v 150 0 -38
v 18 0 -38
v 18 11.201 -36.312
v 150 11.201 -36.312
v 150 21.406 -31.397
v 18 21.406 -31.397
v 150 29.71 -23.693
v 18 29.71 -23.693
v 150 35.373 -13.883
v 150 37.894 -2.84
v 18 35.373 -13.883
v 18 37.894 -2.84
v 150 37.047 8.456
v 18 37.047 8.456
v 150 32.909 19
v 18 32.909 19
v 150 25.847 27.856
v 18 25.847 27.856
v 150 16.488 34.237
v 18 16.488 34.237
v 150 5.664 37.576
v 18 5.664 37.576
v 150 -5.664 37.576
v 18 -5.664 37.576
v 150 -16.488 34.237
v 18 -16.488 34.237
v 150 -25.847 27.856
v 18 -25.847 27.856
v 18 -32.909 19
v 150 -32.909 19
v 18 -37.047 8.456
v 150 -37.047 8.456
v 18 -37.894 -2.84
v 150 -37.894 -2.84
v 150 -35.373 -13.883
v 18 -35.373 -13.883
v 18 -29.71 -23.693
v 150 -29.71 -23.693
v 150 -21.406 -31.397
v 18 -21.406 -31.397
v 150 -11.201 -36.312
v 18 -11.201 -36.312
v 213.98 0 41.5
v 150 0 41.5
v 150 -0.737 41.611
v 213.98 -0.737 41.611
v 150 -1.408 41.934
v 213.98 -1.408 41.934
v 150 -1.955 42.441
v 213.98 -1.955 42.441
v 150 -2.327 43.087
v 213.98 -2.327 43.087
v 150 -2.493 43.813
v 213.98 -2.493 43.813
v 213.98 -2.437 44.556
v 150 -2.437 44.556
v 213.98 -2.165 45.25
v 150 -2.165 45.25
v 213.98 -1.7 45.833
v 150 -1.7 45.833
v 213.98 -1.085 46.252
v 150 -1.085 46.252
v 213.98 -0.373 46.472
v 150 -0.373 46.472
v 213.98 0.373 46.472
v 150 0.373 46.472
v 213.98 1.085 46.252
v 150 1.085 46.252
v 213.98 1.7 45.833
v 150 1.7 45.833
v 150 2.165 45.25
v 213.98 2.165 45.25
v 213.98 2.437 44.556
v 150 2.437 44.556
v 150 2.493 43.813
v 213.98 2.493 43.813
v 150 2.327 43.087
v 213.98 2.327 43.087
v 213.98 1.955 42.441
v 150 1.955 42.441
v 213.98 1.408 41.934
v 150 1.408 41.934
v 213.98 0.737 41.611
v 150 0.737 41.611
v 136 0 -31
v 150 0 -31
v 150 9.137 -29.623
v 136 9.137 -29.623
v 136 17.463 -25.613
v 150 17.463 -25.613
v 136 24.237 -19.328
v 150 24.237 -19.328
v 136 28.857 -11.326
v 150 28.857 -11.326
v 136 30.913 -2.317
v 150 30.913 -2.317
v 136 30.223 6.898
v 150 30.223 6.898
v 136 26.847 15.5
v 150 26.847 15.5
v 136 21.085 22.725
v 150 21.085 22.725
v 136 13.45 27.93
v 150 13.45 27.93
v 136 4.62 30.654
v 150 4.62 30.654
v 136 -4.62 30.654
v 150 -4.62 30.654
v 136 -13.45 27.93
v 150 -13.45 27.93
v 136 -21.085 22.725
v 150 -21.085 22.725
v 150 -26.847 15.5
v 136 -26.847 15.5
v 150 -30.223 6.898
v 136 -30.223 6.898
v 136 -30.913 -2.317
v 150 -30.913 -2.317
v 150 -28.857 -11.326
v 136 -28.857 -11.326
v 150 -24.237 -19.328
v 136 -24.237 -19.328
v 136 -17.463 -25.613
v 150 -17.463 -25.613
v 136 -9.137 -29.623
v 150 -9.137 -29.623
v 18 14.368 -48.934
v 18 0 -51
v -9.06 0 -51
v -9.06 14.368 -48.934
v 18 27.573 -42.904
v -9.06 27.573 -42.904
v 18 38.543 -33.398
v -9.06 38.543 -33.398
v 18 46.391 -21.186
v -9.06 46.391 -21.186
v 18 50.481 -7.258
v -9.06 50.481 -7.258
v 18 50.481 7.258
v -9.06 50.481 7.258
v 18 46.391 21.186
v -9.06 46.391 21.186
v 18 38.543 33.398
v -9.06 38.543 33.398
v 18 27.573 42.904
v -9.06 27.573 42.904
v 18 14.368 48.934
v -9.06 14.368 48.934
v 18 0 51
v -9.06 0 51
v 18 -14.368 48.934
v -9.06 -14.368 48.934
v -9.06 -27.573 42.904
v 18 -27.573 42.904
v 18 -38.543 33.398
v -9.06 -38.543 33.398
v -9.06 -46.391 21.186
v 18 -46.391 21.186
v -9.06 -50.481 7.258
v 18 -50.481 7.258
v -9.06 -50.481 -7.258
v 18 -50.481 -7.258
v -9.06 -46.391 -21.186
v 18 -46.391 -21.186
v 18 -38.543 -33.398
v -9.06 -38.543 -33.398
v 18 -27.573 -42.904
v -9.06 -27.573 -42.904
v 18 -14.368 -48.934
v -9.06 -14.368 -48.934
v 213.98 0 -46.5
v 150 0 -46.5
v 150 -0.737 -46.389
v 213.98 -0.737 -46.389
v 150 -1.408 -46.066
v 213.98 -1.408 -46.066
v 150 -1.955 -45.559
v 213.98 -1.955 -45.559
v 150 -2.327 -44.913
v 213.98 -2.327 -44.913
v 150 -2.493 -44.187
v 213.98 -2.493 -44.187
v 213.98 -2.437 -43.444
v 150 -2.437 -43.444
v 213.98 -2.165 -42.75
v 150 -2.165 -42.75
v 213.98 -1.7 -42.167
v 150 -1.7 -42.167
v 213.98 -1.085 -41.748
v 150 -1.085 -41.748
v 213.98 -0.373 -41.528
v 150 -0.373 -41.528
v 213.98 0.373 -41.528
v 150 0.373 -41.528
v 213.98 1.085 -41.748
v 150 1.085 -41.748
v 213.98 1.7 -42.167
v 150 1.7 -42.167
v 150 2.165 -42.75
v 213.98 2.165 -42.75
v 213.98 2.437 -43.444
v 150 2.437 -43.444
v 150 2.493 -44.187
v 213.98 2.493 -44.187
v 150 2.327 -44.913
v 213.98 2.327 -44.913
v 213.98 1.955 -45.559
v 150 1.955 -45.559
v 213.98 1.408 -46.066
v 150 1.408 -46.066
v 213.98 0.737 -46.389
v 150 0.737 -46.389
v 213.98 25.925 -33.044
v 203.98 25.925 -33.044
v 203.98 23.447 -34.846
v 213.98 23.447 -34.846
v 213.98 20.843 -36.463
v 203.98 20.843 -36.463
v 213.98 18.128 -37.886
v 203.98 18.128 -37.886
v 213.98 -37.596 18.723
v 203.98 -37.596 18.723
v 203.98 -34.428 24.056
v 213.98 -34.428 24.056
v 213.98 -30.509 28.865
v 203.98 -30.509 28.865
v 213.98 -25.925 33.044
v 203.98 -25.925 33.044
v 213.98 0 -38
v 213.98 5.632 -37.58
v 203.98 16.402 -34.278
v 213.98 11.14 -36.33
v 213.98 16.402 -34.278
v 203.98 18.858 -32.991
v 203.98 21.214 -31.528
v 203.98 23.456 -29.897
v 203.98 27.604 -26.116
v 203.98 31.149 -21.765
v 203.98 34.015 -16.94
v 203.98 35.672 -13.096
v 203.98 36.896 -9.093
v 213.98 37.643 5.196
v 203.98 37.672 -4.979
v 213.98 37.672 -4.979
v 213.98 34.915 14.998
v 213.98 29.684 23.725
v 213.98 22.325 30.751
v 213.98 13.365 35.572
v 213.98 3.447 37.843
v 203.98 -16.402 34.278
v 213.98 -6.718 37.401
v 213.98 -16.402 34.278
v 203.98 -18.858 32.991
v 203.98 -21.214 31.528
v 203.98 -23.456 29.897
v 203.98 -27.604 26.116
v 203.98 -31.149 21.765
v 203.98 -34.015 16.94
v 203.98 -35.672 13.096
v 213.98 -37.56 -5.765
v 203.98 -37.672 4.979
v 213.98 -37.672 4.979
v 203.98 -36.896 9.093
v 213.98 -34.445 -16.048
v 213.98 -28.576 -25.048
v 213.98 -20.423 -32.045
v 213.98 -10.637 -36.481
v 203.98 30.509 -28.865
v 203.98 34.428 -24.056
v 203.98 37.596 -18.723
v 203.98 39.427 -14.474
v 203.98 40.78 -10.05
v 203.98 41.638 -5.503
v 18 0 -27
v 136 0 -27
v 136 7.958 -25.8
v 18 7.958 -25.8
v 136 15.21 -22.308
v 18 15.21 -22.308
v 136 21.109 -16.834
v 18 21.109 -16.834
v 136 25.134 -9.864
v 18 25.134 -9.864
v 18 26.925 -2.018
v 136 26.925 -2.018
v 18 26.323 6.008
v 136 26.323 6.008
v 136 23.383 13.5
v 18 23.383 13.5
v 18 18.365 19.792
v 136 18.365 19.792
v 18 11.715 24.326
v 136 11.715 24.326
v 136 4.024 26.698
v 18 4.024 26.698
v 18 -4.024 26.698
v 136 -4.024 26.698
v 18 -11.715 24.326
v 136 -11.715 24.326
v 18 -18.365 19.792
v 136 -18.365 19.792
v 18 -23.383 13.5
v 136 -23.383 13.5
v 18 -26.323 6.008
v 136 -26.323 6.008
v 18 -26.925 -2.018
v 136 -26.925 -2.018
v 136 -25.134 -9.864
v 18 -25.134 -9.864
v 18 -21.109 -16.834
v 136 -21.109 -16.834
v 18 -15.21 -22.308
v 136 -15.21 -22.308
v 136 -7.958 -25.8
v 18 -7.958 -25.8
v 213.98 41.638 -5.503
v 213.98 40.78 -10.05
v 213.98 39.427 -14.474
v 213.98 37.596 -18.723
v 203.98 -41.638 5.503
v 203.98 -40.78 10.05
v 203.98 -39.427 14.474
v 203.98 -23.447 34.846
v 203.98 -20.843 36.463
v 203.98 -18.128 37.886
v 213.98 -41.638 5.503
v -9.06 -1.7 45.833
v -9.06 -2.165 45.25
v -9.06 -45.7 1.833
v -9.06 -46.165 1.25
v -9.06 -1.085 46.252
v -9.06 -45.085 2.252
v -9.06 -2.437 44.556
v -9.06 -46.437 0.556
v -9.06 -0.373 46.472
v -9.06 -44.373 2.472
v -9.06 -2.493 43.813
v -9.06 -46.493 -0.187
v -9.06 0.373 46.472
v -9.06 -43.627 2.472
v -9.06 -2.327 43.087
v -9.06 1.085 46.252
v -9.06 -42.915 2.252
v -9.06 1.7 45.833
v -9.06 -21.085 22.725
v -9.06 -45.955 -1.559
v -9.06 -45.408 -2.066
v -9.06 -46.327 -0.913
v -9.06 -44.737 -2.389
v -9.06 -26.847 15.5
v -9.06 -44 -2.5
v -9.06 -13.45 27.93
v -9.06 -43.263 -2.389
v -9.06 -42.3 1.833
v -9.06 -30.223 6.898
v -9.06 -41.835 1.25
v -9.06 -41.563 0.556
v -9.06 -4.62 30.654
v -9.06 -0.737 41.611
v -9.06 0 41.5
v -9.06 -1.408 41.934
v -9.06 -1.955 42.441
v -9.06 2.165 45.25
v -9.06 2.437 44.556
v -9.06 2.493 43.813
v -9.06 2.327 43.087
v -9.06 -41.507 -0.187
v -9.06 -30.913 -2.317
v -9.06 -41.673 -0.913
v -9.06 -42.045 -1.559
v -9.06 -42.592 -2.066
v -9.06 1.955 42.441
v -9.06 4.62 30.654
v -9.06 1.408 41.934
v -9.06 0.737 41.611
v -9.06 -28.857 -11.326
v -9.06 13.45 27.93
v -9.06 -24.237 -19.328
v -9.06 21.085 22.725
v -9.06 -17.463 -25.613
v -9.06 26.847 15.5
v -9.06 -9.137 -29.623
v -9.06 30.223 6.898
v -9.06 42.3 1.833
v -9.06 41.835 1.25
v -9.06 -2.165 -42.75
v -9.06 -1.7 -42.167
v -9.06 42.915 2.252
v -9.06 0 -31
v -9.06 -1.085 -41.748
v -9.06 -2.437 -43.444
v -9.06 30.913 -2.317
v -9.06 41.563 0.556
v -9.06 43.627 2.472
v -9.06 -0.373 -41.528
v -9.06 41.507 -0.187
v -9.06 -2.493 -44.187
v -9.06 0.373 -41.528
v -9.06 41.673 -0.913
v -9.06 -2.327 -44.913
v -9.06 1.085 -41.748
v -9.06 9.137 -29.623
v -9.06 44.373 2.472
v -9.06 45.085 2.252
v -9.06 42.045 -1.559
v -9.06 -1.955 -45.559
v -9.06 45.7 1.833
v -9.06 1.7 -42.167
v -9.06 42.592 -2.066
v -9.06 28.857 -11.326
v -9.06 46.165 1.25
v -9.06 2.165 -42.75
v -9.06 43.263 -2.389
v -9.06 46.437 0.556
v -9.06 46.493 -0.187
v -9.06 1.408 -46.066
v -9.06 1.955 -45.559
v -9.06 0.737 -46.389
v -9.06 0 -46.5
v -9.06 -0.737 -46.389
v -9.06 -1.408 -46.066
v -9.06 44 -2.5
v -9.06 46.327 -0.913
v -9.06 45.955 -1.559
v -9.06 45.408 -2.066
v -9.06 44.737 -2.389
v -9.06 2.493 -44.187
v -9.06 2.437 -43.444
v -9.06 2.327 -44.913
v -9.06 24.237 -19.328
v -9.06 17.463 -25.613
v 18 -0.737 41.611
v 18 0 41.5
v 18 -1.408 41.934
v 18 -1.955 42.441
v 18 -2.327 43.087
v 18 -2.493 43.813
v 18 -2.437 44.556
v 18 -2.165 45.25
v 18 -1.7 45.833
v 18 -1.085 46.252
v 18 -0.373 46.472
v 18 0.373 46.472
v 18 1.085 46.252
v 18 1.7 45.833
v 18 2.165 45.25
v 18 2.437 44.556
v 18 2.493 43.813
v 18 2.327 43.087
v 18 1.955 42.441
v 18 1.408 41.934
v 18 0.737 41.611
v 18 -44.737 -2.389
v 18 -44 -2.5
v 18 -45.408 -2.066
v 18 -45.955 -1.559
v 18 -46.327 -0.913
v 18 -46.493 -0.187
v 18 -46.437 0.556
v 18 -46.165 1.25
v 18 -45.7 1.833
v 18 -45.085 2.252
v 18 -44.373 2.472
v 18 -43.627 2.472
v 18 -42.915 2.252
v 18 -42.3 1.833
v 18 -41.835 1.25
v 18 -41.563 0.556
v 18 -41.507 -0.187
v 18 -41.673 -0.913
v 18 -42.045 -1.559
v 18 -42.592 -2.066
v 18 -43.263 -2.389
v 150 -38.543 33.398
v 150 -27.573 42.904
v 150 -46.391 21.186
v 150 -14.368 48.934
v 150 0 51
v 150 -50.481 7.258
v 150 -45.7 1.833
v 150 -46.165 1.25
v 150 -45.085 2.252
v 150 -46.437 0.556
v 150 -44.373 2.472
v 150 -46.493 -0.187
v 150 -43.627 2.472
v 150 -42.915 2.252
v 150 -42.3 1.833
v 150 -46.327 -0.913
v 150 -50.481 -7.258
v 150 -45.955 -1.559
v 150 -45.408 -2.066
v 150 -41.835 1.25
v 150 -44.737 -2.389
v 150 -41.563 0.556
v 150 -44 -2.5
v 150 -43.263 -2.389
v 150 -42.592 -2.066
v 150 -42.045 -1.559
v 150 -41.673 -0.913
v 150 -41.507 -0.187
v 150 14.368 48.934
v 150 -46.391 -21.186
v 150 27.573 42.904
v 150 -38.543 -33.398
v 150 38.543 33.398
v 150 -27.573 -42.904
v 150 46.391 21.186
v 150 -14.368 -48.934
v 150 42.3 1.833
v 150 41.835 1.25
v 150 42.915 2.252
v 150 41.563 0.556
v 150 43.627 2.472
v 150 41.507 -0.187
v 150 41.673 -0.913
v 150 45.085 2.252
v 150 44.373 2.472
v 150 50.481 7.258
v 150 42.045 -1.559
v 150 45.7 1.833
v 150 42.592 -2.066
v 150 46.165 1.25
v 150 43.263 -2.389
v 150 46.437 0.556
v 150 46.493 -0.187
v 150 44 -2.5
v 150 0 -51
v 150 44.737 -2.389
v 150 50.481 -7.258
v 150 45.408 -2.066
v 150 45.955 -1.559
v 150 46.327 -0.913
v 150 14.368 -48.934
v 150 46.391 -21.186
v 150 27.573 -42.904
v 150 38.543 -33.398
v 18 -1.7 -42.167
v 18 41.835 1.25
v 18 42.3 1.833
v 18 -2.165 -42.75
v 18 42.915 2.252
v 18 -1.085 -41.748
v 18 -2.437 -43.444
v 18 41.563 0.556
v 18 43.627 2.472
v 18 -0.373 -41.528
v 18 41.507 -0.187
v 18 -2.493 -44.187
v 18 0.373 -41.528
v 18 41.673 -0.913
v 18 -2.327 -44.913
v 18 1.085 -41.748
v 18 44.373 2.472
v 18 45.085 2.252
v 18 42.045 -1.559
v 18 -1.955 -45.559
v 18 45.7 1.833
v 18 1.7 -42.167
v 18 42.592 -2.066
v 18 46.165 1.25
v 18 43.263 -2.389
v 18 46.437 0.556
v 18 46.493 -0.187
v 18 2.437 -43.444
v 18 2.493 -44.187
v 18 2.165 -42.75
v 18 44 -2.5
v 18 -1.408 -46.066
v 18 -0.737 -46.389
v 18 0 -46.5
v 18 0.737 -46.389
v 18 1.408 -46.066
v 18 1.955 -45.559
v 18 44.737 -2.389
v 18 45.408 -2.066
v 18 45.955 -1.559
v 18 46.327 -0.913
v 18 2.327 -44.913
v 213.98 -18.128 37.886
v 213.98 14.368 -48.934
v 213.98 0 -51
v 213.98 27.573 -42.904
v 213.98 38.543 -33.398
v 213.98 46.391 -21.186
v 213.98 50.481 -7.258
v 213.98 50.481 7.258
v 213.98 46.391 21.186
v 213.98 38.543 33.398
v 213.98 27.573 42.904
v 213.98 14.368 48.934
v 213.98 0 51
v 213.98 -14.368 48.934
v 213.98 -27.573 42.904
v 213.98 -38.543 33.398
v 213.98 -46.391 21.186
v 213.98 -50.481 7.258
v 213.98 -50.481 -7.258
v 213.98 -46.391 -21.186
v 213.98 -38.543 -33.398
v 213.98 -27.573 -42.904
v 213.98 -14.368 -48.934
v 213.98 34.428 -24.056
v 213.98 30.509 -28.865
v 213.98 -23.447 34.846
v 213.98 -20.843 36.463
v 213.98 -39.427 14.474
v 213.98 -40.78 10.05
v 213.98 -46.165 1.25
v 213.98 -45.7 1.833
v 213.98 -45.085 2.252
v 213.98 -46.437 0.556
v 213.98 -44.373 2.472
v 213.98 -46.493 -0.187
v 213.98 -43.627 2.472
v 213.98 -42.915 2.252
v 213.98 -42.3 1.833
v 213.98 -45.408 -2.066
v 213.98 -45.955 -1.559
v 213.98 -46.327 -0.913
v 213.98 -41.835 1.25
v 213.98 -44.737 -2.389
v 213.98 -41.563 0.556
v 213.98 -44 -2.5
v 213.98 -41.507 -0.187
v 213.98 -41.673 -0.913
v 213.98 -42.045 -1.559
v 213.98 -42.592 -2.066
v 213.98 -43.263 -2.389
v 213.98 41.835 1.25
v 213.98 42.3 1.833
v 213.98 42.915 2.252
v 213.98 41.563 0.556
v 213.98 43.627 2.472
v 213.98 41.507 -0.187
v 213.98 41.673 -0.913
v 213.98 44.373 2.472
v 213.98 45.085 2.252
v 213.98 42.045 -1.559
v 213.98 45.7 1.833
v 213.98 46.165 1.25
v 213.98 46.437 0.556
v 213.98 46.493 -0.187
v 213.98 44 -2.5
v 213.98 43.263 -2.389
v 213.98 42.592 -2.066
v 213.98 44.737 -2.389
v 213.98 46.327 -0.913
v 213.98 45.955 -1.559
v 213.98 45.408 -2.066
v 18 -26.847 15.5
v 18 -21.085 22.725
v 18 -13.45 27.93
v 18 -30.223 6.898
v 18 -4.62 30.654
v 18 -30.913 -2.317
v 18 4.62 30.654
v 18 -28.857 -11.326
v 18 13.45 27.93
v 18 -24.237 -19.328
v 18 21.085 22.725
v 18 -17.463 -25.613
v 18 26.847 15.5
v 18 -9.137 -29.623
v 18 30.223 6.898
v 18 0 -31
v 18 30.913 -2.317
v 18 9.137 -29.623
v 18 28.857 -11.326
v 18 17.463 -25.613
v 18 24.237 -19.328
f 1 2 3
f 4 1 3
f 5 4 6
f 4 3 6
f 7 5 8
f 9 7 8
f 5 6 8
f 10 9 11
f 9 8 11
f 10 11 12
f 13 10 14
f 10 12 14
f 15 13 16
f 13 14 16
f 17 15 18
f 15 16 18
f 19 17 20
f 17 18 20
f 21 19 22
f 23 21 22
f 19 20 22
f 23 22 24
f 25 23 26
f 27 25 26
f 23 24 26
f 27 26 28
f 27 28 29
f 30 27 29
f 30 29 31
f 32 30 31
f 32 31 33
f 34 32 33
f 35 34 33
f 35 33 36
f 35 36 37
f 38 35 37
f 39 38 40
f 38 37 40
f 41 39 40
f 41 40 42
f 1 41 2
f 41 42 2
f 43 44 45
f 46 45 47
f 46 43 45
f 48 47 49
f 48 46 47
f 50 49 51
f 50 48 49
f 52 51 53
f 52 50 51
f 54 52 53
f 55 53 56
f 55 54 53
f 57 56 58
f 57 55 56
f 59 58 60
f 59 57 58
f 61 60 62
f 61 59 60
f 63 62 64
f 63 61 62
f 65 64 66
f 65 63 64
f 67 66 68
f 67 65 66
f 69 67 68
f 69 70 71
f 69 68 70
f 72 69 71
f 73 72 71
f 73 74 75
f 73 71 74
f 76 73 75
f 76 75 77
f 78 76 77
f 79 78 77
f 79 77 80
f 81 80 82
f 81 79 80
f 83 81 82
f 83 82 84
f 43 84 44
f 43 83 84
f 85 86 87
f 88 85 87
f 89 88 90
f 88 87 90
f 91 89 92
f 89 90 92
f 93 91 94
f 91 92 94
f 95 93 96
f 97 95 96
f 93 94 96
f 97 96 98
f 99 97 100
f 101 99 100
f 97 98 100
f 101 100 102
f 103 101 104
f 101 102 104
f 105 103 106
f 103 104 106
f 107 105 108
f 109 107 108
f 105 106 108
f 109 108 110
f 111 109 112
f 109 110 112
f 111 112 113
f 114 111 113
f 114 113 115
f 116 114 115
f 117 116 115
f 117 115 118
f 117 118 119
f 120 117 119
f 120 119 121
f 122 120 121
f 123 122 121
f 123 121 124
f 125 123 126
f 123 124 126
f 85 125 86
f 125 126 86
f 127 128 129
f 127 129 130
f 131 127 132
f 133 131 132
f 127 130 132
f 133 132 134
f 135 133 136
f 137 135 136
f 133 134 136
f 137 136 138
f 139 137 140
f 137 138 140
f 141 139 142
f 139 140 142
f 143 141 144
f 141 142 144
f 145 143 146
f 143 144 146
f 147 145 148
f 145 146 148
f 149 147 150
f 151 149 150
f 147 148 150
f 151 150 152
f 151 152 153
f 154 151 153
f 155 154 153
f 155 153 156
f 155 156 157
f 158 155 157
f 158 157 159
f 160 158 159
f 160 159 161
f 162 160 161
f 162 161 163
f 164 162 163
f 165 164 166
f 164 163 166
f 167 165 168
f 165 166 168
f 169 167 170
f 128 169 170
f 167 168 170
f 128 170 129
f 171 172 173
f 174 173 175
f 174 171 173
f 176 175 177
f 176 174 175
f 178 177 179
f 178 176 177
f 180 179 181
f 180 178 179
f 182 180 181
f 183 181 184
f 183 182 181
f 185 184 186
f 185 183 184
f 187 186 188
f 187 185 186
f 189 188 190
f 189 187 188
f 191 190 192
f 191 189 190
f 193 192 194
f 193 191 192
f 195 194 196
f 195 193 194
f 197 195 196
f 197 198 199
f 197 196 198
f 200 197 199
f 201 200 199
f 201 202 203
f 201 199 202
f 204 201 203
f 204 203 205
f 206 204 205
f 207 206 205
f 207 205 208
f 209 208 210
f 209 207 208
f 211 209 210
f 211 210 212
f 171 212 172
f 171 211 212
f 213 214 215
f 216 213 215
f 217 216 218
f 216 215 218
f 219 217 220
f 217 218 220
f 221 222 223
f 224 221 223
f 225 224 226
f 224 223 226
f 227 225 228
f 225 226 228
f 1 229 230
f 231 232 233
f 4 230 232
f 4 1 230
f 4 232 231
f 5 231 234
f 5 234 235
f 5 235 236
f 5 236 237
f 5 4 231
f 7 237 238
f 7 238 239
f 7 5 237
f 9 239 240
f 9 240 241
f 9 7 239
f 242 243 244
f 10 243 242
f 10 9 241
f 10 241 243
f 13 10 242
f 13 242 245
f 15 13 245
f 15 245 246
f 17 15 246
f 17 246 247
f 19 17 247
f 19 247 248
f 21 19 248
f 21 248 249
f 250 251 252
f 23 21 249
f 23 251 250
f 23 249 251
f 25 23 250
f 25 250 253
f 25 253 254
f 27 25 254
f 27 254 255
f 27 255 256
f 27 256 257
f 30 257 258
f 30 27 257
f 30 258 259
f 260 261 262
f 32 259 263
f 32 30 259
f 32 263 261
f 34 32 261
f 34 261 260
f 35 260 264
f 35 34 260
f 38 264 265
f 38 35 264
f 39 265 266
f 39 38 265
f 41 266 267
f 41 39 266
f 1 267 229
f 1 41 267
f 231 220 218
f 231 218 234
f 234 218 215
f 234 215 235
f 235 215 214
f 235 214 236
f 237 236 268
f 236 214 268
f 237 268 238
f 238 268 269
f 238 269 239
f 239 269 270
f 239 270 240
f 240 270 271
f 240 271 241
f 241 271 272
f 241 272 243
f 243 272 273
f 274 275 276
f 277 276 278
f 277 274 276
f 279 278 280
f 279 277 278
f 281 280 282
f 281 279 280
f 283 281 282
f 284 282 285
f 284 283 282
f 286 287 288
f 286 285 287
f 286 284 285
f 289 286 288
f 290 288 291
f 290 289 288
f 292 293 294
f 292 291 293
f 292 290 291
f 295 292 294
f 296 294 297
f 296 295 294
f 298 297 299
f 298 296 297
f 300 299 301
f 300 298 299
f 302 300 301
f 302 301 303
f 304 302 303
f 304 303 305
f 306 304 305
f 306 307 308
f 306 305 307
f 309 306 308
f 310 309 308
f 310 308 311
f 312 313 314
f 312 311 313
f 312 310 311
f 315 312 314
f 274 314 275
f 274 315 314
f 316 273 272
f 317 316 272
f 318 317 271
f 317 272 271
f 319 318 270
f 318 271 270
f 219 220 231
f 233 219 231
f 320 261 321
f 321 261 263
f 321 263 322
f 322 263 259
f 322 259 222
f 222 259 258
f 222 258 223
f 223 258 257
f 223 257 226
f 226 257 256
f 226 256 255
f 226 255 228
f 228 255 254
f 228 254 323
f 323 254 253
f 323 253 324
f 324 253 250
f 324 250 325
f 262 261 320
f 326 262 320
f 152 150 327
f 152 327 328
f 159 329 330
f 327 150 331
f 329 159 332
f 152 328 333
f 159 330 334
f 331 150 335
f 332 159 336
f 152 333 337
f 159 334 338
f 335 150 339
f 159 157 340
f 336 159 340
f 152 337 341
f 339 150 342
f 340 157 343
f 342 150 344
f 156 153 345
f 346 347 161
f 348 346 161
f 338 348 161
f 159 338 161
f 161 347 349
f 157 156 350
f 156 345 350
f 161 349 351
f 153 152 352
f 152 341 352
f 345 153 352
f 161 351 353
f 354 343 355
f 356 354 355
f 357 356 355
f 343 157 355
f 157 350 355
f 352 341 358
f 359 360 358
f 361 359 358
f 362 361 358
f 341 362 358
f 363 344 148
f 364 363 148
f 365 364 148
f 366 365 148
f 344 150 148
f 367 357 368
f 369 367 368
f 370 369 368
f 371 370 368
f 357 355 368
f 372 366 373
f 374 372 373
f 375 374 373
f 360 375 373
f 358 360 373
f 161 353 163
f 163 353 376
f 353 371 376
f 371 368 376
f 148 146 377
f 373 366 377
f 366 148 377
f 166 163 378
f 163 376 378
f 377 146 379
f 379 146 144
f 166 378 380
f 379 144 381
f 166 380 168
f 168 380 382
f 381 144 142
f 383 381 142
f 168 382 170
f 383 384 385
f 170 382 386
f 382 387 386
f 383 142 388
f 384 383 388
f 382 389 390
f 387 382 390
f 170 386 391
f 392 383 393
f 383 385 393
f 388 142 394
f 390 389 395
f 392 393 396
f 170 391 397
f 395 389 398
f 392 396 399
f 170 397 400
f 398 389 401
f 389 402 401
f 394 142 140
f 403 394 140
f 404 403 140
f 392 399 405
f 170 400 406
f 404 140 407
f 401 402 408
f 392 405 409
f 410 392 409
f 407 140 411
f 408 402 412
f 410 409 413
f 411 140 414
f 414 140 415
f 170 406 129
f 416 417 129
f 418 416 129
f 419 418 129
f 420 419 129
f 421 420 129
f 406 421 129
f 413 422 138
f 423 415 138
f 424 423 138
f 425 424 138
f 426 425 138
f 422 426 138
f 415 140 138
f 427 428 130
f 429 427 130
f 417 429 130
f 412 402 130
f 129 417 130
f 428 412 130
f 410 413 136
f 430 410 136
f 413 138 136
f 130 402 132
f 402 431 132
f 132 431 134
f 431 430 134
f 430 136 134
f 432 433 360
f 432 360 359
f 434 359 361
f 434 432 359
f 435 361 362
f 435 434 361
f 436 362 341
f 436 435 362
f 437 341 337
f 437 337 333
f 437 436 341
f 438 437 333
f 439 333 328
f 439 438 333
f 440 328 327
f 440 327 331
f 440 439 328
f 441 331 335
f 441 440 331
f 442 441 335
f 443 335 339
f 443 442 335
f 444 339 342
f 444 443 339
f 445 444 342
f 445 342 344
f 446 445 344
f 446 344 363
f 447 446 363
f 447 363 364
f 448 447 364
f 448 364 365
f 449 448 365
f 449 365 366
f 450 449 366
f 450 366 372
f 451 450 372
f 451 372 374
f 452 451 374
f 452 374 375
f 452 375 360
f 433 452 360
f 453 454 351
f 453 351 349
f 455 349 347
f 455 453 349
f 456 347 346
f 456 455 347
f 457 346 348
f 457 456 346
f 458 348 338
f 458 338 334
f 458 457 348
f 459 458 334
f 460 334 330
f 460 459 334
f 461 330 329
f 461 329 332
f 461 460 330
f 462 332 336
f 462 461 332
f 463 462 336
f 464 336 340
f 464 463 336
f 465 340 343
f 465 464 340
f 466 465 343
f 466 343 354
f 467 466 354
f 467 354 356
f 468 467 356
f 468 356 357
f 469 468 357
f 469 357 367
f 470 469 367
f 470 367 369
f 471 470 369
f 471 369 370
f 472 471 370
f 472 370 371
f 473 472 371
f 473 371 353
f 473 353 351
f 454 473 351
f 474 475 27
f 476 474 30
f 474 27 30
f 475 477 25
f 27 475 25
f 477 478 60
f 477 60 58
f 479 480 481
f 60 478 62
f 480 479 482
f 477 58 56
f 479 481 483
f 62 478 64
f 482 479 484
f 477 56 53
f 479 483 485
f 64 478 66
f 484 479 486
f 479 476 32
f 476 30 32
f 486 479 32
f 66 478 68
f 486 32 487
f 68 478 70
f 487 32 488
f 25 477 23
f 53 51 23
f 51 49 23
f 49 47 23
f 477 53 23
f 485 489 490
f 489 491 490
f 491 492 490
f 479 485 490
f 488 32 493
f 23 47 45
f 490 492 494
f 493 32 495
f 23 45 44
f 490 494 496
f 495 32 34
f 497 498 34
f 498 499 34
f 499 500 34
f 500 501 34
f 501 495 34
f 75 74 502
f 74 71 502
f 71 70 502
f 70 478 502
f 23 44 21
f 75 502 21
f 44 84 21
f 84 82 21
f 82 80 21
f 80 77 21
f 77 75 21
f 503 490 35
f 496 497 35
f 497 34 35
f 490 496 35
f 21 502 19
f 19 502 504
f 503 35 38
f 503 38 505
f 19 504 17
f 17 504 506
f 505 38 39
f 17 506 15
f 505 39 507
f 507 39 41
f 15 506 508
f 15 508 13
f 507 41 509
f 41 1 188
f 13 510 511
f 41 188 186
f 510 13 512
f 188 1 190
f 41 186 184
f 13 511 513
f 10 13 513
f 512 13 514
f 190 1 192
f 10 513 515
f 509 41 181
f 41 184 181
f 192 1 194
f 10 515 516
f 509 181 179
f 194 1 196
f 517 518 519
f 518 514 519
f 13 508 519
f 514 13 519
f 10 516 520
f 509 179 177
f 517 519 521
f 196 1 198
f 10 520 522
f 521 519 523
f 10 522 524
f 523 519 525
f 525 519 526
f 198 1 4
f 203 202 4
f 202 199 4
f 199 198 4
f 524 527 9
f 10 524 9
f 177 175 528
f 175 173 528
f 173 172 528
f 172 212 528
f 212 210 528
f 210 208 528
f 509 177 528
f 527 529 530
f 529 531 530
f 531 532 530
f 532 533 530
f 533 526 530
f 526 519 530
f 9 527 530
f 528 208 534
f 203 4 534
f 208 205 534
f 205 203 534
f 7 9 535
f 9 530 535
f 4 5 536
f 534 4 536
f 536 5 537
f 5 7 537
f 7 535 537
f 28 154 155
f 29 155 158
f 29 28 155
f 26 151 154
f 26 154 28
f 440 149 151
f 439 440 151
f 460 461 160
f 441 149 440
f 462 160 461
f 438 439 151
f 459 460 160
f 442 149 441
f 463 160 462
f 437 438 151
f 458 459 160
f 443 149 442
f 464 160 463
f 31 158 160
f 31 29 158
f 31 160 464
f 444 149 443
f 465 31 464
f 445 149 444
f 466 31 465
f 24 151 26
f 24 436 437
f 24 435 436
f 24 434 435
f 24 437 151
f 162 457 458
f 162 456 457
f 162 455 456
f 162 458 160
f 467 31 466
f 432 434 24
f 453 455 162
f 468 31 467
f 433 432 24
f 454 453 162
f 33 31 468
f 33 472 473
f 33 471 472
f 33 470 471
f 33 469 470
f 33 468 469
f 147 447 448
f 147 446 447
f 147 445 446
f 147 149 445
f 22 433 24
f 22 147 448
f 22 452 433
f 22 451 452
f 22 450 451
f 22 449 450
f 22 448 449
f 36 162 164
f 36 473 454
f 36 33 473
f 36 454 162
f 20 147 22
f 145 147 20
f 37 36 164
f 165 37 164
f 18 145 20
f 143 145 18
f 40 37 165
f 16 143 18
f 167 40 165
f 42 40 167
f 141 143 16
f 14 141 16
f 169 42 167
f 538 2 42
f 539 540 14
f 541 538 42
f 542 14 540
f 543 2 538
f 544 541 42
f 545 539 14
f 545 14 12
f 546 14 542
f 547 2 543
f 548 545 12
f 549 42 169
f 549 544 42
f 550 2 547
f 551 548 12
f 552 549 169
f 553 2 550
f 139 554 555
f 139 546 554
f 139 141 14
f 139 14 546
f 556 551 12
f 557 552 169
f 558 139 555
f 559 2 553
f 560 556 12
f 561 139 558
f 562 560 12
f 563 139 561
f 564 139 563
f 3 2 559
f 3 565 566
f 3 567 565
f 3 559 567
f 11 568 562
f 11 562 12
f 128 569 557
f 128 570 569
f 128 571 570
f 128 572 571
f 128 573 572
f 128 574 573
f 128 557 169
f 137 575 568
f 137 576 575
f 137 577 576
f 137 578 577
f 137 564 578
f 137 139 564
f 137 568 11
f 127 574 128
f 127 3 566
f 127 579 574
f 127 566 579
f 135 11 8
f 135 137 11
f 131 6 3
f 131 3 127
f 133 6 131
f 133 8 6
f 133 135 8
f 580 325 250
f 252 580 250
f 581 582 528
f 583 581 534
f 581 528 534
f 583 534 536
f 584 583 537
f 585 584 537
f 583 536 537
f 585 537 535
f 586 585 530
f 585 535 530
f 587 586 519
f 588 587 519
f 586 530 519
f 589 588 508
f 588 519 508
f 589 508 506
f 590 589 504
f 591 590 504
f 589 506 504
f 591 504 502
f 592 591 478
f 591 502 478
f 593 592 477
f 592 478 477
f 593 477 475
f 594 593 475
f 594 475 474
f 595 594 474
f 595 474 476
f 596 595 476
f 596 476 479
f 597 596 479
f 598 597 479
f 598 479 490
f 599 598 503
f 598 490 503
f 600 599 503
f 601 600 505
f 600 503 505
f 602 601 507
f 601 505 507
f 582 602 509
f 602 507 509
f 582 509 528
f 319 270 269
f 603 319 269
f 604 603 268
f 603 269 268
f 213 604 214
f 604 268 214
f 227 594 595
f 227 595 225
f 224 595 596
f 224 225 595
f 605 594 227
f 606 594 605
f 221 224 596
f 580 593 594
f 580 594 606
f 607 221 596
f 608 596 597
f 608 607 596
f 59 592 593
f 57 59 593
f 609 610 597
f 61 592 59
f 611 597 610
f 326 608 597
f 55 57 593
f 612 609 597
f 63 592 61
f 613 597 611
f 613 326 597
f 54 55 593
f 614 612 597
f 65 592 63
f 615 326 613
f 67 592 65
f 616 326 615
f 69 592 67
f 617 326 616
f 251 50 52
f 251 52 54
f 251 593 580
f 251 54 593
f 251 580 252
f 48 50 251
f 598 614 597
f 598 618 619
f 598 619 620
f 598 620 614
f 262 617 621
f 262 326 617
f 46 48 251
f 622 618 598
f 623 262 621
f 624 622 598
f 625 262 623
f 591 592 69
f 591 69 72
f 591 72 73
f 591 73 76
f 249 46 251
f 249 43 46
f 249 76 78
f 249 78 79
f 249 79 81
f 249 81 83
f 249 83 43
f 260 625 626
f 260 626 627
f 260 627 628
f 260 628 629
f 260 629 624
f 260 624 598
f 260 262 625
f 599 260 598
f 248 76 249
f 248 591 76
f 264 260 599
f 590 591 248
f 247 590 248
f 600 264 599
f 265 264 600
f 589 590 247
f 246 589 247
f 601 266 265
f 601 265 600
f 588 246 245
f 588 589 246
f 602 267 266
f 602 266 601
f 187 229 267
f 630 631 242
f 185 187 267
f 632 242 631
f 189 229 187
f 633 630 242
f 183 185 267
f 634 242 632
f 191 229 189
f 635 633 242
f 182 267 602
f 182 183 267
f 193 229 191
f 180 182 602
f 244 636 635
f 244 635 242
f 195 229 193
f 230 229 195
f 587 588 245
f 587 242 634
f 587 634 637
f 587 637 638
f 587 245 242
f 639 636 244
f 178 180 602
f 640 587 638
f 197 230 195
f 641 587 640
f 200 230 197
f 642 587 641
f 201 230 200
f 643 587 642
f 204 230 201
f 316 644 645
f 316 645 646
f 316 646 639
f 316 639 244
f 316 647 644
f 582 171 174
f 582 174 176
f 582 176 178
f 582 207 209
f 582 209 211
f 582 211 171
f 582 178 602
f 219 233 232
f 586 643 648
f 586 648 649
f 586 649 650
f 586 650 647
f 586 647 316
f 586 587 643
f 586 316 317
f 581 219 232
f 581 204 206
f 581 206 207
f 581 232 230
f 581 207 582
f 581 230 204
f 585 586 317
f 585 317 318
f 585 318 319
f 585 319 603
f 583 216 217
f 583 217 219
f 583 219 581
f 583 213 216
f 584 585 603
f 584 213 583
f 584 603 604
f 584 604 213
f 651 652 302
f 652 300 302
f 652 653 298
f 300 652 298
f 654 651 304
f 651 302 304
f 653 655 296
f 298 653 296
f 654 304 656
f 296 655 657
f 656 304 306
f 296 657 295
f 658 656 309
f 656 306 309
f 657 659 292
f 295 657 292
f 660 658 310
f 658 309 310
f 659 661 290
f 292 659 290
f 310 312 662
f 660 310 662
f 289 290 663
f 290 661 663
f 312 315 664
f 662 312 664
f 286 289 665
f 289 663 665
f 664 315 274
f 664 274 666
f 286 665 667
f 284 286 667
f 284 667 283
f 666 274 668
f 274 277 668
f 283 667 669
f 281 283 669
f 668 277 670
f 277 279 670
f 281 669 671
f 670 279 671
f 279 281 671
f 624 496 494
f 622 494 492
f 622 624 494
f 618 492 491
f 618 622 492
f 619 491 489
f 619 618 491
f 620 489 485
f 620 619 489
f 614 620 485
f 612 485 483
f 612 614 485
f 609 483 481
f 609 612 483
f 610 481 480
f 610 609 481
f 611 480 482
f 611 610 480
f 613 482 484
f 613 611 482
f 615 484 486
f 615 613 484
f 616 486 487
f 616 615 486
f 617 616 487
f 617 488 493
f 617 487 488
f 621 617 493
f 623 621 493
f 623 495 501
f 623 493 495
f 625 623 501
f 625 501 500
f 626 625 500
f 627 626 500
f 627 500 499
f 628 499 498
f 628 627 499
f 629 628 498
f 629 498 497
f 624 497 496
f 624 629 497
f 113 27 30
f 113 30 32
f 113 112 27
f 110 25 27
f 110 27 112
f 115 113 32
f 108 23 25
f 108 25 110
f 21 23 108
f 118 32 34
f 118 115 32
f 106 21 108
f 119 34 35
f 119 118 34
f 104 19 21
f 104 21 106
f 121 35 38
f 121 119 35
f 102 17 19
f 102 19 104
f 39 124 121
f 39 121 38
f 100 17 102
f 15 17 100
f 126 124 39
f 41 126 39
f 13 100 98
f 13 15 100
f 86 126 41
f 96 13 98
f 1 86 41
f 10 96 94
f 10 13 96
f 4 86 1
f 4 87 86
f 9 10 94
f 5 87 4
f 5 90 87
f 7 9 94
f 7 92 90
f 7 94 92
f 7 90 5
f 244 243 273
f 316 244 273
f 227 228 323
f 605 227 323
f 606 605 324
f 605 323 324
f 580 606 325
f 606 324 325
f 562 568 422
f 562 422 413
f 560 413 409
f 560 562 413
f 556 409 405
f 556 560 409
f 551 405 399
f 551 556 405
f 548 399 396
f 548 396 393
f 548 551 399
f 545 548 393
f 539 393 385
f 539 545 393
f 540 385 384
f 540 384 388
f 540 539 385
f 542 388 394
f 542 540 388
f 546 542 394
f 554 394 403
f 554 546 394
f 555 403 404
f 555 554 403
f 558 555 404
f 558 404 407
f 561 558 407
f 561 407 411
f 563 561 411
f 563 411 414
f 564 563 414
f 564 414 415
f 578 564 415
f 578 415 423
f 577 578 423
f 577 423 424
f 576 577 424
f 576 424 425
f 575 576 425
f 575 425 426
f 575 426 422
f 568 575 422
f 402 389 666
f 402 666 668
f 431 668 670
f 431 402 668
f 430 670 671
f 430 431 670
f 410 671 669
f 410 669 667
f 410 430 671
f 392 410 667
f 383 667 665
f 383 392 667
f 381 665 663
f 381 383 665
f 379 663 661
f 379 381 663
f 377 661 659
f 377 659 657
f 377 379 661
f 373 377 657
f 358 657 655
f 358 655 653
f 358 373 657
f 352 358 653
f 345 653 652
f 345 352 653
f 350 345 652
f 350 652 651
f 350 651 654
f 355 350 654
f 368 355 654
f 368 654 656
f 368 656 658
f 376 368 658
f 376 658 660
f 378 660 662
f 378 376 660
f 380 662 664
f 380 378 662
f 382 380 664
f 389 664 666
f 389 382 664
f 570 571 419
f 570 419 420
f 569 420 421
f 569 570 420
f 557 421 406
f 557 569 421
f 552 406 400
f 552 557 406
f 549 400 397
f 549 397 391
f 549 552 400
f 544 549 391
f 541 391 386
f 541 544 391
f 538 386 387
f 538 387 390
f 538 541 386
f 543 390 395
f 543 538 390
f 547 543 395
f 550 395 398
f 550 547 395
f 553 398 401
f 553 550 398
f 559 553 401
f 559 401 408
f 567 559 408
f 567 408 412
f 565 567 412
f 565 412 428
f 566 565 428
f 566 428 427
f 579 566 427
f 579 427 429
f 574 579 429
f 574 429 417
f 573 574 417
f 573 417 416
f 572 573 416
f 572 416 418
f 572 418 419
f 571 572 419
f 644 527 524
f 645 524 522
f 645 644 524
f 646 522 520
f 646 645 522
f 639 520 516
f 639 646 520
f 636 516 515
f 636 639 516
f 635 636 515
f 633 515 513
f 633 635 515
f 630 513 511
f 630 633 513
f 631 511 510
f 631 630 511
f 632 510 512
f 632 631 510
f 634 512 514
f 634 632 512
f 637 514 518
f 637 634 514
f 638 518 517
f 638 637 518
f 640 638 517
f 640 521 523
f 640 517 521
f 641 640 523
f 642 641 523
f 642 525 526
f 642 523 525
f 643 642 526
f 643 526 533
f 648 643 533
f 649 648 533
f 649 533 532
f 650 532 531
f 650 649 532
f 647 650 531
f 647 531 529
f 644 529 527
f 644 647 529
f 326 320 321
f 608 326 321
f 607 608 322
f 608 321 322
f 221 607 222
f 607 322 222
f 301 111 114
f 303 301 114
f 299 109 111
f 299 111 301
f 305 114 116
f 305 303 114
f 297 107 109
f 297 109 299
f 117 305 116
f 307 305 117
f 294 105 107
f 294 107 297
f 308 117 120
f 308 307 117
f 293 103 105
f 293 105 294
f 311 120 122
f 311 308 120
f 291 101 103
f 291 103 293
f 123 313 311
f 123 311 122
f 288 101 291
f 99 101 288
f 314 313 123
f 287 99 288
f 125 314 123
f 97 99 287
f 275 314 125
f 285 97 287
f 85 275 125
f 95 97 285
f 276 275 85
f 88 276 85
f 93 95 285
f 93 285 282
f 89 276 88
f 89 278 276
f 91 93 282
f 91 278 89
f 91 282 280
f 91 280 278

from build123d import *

# Parameters (mm, degrees)
EXTRUDE_1_DEPTH      = 18
EXTRUDE_1_DEPTH_BACK = 9.06
SKETCH_1_R           = 51
SKETCH_1_R_2         = 31
SKETCH_2_R           = 38
SKETCH_2_R_2         = 27
EXTRUDE_2_DEPTH      = 132
SKETCH_3_R           = 51
SKETCH_3_R_2         = 38
EXTRUDE_3_DEPTH      = 63.98
CUT_EXTRUDE_START    = -223.04
SKETCH_4_R           = 2.5
CUT_EXTRUDE_1_DEPTH  = 223.04
CUT_EXTRUDE_START_2  = -10
CUT_EXTRUDE_2_DEPTH  = 10
SKETCH_6_R           = 31
CUT_EXTRUDE_3_DEPTH  = 14


with BuildPart() as part:
    # 草图1 → 凸台-拉伸1 (new, two sides: drawn at the far end of the back side and taken through both)
    with BuildSketch(Plane(origin=(0, 0, 0), x_dir=(0, 0, -1), z_dir=(1, 0, 0)).offset(-EXTRUDE_1_DEPTH_BACK)):
        Circle(SKETCH_1_R)
        Circle(SKETCH_1_R_2, mode=Mode.SUBTRACT)
    extrude(amount=EXTRUDE_1_DEPTH + EXTRUDE_1_DEPTH_BACK)

    # 草图2 → 凸台-拉伸2 (add)
    with BuildSketch(Plane(origin=(18, 0, 0), x_dir=(0, 0, -1), z_dir=(1, 0, 0))):
        Circle(SKETCH_2_R)
        Circle(SKETCH_2_R_2, mode=Mode.SUBTRACT)
    extrude(amount=EXTRUDE_2_DEPTH)


with BuildPart() as body_2:
    # 草图3 → 凸台-拉伸3 (new body)
    with BuildSketch(Plane(origin=(150, 0, 0), x_dir=(0, 0, -1), z_dir=(1, 0, 0))):
        Circle(SKETCH_3_R)
        Circle(SKETCH_3_R_2, mode=Mode.SUBTRACT)
    extrude(amount=EXTRUDE_3_DEPTH)


with BuildPart() as cut_extrude_1_tool:
    # 草图4 → 切除-拉伸1 (new body)
    with BuildSketch(Plane.ZY.offset(9.06).offset(CUT_EXTRUDE_START)):
        with Locations(Location((0, 44, 0), (0, 0, 180))):
            Circle(SKETCH_4_R)
        with Locations(Location((44, 0, 0), (0, 0, 180))):
            Circle(SKETCH_4_R)
        with Locations(Location((0, -44, 0), (0, 0, 180))):
            Circle(SKETCH_4_R)
        with Locations(Location((-44, 0, 0), (0, 0, 180))):
            Circle(SKETCH_4_R)
    extrude(amount=CUT_EXTRUDE_1_DEPTH)


with BuildPart() as part_1:
    add(part.part)

    # 切除-拉伸1: cut by cut_extrude_1_tool
    add(cut_extrude_1_tool.part, mode=Mode.SUBTRACT)

    # 草图6 → 切除-拉伸3 (cut)
    with BuildSketch(Plane(origin=(150, 0, 0), x_dir=(0, 0, -1), z_dir=(1, 0, 0))):
        Circle(SKETCH_6_R)
    extrude(amount=-CUT_EXTRUDE_3_DEPTH, mode=Mode.SUBTRACT)


with BuildPart() as body_2_1:
    add(body_2.part)

    # 切除-拉伸1: cut by cut_extrude_1_tool
    add(cut_extrude_1_tool.part, mode=Mode.SUBTRACT)

    # 草图5 → 切除-拉伸2 (cut)
    with BuildSketch(Plane(origin=(213.98, 0, 0), x_dir=(0, 0, -1), z_dir=(1, 0, 0)).offset(CUT_EXTRUDE_START_2)):
        with BuildLine():
            Line((4.979052634, 37.672390883), (5.503163437, 41.637905713))
            ThreePointArc((5.503163437, 41.637905713), (12.280668917, 40.16447648), (18.723271545, 37.595732506))
            ThreePointArc((18.723271545, 37.595732506), (26.533013809, 32.557628572), (33.043562457, 25.925334717))
            ThreePointArc((33.043562457, 25.925334717), (35.678505016, 22.159518943), (37.886189575, 18.128338023))
            Line((37.886189575, 18.128338023), (34.277981044, 16.40182964))
            ThreePointArc((34.277981044, 16.40182964), (32.280552158, 20.049088568), (29.896556508, 23.45625522))
            ThreePointArc((29.896556508, 23.45625522), (24.006060113, 29.456902041), (16.940102827, 34.015186553))
            ThreePointArc((16.940102827, 34.015186553), (11.111081401, 36.339288244), (4.979052634, 37.672390883))
        make_face()
        with BuildLine():
            Line((-4.979052634, -37.672390883), (-5.503163437, -41.637905713))
            ThreePointArc((-5.503163437, -41.637905713), (-12.280668917, -40.16447648), (-18.723271545, -37.595732506))
            ThreePointArc((-18.723271545, -37.595732506), (-26.533013809, -32.557628572), (-33.043562457, -25.925334717))
            ThreePointArc((-33.043562457, -25.925334717), (-35.678505016, -22.159518943), (-37.886189575, -18.128338023))
            Line((-37.886189575, -18.128338023), (-34.277981044, -16.40182964))
            ThreePointArc((-34.277981044, -16.40182964), (-32.280552158, -20.049088568), (-29.896556508, -23.45625522))
            ThreePointArc((-29.896556508, -23.45625522), (-24.006060113, -29.456902041), (-16.940102827, -34.015186553))
            ThreePointArc((-16.940102827, -34.015186553), (-11.111081401, -36.339288244), (-4.979052634, -37.672390883))
        make_face()
    extrude(amount=CUT_EXTRUDE_2_DEPTH, mode=Mode.SUBTRACT)


solid = Compound([part_1.part, body_2_1.part])
